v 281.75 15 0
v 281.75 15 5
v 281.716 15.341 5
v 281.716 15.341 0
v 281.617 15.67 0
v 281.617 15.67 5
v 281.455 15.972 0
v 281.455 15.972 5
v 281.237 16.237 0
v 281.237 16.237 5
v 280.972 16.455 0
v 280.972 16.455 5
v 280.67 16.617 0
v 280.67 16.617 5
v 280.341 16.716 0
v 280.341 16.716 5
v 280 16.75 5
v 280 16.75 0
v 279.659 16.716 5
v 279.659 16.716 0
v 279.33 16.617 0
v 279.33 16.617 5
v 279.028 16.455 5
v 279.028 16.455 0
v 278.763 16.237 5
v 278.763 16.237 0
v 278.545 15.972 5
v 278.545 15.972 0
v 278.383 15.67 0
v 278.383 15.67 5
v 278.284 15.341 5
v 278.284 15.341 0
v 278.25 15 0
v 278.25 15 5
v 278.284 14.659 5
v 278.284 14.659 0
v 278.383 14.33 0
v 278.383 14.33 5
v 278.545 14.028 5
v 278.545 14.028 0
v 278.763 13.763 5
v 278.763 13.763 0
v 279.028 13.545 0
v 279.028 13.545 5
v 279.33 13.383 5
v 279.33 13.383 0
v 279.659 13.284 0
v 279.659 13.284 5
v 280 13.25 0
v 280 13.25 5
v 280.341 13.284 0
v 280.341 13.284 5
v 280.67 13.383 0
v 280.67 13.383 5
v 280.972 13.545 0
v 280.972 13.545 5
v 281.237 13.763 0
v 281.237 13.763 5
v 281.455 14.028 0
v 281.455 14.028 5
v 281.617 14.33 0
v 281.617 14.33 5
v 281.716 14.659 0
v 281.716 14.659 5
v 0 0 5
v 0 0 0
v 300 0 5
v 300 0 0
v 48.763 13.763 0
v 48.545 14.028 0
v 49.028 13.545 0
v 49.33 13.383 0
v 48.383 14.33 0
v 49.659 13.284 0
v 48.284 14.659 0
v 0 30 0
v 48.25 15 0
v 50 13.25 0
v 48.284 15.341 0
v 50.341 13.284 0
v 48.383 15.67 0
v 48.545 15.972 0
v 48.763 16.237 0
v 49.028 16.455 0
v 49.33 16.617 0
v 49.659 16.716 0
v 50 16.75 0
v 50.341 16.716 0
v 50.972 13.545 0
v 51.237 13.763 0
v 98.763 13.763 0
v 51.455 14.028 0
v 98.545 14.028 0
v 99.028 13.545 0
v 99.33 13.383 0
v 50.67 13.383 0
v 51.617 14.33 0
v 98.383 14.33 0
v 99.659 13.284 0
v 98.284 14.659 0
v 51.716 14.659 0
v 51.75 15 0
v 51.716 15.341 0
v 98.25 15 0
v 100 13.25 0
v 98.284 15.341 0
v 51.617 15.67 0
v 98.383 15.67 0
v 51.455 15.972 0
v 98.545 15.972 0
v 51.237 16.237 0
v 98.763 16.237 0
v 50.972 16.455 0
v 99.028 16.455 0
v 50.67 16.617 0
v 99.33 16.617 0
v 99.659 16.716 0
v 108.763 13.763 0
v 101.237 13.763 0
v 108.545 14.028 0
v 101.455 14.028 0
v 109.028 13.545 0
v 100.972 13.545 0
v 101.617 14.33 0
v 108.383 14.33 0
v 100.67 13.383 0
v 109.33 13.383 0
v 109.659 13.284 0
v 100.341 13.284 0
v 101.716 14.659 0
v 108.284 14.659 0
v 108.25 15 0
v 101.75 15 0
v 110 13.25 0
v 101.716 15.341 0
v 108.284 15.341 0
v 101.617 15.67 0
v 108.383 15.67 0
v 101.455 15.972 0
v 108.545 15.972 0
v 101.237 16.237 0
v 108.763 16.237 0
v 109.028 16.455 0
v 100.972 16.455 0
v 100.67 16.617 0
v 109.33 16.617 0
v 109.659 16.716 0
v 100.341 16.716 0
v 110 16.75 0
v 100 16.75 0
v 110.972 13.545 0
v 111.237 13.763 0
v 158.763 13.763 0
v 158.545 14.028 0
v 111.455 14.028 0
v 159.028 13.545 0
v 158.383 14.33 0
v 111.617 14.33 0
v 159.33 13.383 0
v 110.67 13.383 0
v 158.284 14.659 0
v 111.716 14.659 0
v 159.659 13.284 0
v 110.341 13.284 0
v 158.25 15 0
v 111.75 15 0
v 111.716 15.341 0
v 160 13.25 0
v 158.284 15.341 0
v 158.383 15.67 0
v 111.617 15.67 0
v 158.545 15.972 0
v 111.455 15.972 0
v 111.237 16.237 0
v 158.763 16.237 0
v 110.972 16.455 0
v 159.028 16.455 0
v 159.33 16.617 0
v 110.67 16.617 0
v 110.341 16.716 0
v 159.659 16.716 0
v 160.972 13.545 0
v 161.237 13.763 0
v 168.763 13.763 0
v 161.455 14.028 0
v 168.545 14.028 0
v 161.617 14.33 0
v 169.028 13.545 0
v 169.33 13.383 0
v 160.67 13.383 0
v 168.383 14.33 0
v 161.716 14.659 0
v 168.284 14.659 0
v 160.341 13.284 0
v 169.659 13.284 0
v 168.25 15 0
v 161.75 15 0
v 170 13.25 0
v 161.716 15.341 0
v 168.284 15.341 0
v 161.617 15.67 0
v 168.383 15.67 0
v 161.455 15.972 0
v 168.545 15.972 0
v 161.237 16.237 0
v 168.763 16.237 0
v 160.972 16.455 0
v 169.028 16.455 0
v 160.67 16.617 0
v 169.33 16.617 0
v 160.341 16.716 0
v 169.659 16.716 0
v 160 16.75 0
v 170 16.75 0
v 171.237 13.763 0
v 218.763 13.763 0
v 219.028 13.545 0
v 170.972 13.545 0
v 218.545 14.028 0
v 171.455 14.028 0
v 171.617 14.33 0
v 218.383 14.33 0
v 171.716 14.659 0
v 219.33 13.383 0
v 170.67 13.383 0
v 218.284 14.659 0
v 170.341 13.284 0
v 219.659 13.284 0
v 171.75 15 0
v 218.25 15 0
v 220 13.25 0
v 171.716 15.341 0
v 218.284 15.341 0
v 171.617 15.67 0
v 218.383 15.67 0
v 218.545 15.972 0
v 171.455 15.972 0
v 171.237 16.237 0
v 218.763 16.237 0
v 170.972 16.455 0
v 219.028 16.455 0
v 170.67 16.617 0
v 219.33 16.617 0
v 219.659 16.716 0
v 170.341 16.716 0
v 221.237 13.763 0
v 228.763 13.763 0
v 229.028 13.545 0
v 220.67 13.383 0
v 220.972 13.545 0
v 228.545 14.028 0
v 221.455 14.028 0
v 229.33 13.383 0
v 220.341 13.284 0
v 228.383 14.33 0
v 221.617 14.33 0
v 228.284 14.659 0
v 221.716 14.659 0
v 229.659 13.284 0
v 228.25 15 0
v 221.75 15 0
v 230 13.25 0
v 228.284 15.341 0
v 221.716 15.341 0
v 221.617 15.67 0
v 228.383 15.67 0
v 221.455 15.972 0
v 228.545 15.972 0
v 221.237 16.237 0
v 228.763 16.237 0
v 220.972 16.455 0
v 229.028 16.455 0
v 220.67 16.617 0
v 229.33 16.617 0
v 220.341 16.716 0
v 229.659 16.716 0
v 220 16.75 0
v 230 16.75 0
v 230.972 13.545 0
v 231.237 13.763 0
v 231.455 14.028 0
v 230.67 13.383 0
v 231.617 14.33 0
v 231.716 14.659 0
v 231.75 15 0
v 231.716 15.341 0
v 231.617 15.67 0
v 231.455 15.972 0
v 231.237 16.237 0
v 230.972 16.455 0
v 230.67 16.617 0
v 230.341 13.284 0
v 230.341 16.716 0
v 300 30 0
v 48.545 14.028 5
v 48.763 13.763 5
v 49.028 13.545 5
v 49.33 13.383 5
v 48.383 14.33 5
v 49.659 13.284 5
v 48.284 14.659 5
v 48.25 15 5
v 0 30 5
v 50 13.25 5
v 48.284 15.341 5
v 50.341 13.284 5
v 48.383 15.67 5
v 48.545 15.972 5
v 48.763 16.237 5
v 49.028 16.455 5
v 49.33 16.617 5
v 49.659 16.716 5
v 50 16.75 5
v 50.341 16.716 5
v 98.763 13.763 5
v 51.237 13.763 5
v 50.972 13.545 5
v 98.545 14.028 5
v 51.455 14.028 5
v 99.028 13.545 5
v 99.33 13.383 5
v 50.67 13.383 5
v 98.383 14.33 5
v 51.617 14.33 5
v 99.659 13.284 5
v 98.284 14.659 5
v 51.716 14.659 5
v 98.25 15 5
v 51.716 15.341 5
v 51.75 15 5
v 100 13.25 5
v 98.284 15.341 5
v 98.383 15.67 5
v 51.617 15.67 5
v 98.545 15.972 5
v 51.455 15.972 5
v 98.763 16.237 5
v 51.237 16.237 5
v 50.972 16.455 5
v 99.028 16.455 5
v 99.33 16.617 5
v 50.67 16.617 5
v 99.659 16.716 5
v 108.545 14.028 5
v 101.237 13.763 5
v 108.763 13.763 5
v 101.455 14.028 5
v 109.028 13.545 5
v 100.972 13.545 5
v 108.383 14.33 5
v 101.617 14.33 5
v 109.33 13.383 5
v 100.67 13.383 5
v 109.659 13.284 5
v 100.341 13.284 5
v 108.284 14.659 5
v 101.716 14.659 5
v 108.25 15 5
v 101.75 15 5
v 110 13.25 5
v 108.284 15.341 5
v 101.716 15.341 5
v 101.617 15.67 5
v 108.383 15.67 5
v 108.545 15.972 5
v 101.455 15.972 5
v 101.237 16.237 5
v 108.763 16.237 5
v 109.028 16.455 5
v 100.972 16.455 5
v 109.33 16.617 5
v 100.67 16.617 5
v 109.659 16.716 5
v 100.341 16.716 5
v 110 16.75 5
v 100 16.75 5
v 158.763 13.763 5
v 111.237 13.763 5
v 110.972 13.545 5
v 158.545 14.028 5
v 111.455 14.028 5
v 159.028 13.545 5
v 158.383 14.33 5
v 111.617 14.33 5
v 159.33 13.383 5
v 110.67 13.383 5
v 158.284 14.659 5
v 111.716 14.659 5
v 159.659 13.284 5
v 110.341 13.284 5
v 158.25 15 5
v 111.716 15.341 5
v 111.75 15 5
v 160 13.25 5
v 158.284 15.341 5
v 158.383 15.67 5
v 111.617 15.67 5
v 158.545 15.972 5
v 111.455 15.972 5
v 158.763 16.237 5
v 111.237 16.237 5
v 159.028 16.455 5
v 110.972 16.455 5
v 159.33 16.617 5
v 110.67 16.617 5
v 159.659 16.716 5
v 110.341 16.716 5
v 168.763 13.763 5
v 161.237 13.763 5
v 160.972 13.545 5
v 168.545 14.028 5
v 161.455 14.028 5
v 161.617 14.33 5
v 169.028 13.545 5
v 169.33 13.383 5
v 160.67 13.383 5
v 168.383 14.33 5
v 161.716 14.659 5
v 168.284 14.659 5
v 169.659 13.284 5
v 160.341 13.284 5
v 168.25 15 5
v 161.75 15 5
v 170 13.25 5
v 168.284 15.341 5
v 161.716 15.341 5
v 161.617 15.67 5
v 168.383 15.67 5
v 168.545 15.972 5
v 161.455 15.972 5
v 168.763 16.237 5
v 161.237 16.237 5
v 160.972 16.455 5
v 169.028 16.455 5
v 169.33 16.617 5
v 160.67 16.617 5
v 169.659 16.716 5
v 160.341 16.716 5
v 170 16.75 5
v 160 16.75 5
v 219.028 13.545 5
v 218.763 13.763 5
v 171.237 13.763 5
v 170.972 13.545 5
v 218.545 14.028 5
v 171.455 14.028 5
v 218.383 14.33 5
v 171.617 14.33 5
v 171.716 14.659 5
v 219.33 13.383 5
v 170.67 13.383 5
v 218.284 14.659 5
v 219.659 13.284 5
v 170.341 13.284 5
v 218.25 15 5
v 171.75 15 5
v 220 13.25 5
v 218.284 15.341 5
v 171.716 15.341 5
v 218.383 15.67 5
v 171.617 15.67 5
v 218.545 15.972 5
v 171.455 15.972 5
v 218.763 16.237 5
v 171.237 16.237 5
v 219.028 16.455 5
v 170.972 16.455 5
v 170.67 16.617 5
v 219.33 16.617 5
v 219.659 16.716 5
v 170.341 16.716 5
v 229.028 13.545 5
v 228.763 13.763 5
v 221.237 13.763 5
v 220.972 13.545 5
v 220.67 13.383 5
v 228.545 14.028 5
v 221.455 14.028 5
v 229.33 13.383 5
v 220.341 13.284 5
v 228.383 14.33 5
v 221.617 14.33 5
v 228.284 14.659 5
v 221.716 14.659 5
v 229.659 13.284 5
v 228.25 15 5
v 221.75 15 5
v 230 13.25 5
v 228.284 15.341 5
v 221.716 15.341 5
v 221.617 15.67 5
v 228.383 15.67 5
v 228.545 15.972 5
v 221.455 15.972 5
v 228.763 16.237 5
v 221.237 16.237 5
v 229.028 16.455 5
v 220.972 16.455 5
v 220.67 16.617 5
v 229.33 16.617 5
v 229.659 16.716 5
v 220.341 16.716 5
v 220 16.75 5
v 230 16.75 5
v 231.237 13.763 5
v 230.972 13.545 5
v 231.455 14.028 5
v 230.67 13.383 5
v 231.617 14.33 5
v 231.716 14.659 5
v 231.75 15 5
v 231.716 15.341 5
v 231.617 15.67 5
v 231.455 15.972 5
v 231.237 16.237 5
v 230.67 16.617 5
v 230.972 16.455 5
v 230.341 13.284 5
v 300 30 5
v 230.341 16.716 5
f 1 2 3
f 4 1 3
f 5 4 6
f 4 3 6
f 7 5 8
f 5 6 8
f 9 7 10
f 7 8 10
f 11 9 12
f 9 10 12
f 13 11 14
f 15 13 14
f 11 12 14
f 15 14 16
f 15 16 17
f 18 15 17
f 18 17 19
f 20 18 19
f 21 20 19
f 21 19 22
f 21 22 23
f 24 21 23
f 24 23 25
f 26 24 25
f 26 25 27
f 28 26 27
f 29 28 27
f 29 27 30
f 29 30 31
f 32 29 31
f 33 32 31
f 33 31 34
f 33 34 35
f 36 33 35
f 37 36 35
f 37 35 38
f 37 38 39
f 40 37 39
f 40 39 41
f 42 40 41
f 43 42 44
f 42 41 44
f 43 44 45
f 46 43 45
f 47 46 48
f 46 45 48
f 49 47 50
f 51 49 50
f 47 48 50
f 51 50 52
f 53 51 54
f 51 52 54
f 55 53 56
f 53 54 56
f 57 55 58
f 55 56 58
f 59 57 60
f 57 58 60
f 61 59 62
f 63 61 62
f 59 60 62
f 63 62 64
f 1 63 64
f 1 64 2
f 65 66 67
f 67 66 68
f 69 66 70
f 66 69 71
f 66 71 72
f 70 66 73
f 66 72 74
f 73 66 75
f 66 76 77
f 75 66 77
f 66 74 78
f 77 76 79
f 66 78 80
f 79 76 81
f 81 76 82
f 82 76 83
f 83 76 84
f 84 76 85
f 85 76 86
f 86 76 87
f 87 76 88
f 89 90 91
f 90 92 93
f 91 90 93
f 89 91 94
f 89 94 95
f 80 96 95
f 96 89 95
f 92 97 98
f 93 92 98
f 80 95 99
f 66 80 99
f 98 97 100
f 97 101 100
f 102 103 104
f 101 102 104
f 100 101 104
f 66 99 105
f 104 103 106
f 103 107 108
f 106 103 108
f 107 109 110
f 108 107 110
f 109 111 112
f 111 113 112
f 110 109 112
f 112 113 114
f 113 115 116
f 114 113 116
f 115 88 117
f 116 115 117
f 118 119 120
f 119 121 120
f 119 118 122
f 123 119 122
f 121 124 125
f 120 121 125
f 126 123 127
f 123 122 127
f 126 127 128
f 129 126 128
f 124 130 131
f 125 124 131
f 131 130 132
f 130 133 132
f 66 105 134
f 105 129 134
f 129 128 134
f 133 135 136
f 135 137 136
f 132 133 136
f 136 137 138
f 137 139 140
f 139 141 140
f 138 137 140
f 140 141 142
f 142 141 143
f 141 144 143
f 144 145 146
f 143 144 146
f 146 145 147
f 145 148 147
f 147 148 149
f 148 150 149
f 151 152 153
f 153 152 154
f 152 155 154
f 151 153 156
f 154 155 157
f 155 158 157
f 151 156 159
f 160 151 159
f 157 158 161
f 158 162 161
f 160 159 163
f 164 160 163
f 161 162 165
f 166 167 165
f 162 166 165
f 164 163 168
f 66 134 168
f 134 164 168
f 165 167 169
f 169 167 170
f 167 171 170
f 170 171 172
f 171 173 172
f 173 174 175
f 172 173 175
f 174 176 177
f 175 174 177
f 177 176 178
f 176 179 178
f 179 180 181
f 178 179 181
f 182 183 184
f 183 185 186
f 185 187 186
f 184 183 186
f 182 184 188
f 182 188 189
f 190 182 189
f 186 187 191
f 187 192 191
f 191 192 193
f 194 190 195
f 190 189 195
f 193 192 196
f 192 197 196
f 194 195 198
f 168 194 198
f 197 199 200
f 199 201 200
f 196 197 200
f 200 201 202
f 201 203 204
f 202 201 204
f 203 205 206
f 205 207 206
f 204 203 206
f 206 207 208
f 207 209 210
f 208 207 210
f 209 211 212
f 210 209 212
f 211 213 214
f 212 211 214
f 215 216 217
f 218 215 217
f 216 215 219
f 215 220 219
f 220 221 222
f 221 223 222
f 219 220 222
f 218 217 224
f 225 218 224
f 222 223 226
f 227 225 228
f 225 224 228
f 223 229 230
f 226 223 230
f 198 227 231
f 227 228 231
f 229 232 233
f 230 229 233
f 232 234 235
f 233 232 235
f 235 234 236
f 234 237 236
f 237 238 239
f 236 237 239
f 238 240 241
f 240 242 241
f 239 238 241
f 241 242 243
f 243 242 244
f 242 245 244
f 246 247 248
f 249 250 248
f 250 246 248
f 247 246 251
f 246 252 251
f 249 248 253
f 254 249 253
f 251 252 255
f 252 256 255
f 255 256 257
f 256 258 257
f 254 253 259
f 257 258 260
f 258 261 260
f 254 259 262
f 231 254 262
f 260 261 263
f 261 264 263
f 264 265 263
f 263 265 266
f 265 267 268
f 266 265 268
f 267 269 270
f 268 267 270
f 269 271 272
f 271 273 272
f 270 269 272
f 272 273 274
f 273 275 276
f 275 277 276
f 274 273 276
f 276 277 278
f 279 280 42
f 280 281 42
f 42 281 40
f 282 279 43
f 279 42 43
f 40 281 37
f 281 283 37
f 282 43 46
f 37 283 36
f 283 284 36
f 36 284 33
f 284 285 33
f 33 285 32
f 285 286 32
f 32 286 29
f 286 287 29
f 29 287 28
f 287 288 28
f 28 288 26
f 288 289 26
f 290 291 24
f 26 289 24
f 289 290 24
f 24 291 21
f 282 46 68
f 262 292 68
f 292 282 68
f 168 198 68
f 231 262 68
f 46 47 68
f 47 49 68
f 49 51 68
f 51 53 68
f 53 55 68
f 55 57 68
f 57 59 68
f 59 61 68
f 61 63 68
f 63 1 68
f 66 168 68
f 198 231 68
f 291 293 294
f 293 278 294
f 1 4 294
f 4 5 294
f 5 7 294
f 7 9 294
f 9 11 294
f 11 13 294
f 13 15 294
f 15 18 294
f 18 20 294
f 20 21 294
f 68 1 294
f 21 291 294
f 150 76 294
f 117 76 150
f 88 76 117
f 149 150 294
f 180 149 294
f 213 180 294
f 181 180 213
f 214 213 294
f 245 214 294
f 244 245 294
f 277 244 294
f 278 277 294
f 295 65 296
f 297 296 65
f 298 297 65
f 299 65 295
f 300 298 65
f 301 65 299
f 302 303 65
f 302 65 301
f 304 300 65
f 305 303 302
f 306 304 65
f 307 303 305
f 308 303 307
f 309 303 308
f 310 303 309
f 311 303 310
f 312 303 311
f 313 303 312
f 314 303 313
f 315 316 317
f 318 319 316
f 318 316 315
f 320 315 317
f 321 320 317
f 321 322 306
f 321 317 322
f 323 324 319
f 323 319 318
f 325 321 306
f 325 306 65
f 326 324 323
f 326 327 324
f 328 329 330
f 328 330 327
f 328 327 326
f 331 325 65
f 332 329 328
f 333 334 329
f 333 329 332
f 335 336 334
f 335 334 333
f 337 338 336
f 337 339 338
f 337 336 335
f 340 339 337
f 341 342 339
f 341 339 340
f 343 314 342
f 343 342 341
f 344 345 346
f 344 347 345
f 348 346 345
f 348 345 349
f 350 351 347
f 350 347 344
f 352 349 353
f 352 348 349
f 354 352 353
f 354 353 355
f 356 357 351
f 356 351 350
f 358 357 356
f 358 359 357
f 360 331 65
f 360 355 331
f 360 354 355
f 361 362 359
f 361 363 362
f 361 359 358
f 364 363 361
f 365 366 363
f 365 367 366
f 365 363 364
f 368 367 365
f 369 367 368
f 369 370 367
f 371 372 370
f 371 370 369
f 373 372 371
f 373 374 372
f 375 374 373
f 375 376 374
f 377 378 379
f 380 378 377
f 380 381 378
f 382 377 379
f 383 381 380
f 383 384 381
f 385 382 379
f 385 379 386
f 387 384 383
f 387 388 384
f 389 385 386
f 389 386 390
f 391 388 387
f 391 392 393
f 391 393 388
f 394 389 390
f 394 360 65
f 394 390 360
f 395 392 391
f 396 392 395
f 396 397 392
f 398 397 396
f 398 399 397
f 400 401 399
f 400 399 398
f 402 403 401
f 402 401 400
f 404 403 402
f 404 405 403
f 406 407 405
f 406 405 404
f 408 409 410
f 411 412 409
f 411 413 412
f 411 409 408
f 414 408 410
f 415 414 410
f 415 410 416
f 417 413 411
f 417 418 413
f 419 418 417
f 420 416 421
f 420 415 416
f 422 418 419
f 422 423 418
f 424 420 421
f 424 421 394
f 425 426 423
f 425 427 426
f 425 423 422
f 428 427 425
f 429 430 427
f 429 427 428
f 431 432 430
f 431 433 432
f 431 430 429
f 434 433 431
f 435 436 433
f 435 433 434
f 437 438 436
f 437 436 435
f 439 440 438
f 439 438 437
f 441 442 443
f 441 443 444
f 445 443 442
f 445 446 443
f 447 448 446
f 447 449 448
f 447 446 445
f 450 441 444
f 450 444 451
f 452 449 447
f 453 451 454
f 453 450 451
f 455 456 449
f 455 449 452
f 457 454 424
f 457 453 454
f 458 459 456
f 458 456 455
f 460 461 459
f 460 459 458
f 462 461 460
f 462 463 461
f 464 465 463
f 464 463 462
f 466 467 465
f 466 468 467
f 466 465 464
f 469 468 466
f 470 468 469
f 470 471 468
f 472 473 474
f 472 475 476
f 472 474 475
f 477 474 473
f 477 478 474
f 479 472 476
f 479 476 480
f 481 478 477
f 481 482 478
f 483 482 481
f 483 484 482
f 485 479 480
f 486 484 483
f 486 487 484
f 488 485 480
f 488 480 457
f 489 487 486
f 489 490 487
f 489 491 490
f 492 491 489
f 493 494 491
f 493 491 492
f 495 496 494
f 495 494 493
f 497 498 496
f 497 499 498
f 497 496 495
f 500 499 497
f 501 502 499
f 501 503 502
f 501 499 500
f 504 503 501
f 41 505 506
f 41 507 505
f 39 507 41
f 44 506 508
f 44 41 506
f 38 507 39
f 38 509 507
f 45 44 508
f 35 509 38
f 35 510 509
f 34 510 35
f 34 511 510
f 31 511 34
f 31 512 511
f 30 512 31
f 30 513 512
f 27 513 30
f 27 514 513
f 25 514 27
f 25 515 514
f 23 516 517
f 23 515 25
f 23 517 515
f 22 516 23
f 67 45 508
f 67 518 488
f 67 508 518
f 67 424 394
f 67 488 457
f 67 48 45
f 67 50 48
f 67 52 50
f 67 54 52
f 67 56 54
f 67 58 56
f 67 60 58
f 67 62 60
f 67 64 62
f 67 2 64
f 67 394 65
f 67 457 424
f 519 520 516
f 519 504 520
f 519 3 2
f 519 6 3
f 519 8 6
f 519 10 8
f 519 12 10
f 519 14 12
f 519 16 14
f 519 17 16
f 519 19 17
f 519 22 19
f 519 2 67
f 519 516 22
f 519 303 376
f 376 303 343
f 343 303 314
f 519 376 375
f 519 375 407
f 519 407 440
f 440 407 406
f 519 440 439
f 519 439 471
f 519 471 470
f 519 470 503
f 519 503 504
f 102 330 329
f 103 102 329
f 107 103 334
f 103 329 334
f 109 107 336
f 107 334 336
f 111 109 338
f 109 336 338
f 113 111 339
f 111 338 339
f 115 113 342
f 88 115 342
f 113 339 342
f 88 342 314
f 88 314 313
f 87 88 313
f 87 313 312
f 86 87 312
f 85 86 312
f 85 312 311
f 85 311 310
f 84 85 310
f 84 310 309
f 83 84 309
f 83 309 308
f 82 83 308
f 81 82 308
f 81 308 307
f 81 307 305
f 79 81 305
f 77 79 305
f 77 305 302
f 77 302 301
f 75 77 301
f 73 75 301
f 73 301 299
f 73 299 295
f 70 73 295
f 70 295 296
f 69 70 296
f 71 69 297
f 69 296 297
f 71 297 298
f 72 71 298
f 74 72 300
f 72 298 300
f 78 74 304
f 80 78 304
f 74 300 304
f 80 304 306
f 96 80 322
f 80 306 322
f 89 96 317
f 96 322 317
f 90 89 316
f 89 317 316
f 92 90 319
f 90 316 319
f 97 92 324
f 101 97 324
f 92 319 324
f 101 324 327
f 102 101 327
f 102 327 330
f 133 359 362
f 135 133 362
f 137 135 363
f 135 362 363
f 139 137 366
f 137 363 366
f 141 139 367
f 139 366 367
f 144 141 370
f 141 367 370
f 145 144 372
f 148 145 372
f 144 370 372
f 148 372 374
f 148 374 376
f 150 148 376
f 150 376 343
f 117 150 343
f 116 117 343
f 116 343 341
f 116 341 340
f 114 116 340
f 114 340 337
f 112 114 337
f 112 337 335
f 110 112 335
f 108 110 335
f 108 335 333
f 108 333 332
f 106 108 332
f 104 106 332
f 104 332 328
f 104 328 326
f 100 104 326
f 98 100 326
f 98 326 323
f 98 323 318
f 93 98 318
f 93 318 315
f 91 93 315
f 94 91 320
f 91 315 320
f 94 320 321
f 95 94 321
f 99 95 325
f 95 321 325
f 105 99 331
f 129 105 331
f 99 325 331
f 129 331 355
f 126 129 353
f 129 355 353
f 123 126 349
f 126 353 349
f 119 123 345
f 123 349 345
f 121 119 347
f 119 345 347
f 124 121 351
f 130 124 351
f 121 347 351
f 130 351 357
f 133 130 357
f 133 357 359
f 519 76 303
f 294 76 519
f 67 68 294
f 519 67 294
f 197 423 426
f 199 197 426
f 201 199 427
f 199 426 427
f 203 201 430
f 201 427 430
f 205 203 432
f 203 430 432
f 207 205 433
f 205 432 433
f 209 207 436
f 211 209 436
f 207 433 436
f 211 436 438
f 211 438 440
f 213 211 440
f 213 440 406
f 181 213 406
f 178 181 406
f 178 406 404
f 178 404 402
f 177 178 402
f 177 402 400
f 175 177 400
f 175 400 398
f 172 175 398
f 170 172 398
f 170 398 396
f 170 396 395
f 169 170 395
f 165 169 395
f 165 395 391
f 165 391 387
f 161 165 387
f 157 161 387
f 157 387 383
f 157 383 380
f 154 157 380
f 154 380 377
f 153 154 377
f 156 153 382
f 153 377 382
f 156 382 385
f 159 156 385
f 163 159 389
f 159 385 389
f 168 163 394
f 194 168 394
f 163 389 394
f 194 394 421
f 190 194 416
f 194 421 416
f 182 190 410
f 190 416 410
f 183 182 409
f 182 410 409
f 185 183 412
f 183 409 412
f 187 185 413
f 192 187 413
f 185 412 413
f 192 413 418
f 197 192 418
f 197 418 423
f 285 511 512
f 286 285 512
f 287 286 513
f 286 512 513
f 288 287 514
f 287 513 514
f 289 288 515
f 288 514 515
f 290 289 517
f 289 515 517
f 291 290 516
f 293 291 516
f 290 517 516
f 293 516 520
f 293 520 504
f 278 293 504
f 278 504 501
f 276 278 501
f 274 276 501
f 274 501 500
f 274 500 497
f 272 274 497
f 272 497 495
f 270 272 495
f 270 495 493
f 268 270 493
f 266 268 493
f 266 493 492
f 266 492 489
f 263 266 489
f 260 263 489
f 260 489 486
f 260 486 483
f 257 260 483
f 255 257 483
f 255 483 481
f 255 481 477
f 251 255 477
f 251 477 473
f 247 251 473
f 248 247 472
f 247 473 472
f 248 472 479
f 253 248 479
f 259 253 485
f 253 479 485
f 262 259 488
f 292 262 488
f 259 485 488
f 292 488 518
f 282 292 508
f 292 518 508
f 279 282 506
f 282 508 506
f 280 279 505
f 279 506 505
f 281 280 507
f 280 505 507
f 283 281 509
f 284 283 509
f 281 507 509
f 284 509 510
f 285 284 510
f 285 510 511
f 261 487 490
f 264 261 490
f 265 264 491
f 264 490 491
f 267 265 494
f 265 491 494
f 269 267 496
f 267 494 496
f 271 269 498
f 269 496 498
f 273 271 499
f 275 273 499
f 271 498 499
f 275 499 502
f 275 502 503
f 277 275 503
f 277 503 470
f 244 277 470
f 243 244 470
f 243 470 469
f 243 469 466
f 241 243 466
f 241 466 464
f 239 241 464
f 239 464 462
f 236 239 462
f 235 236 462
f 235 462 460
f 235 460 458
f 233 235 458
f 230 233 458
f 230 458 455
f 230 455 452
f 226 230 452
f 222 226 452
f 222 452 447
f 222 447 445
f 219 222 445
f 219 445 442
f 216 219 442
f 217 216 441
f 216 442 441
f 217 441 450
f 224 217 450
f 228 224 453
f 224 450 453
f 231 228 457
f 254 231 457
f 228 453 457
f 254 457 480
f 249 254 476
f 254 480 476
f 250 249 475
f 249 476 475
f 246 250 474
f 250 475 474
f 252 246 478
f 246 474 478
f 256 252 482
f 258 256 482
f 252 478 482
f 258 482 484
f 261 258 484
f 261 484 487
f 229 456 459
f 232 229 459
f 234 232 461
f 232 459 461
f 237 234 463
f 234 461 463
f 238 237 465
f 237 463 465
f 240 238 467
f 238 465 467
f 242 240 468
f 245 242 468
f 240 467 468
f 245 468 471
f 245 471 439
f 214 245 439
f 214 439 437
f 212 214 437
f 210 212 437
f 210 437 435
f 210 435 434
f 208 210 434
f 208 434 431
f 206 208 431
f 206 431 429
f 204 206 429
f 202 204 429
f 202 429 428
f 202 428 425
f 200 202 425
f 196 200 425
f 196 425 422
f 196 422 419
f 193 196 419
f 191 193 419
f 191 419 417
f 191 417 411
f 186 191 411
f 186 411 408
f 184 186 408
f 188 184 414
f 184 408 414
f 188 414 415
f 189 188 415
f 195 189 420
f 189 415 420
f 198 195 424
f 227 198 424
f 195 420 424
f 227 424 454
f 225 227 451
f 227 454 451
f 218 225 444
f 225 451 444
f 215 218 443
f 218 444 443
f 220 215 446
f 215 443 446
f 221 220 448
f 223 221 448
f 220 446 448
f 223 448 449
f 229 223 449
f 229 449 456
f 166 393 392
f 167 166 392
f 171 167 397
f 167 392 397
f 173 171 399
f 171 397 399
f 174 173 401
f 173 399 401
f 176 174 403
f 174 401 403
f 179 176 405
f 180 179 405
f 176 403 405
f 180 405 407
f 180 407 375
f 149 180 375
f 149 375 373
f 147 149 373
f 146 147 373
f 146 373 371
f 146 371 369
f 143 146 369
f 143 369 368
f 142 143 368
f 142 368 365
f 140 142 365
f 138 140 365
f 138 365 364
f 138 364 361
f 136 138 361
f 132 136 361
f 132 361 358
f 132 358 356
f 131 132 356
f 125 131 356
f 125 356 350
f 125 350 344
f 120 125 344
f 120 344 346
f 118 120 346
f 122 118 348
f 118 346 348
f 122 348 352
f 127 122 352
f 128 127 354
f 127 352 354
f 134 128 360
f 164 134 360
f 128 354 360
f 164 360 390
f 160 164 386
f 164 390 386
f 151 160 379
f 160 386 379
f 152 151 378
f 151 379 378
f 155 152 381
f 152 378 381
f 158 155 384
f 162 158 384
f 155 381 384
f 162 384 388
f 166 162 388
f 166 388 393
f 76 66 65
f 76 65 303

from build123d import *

# Parameters (mm, degrees)
SKETCH1_W           = 300
SKETCH1_H           = 30
BOSS_EXTRUDE1_DEPTH = 5
SKETCH2_R           = 1.75
CUT_EXTRUDE1_DEPTH  = 6


with BuildPart() as part:
    # Sketch1 → Boss-Extrude1 (new body)
    with BuildSketch(Plane.XY):
        with Locations((150, 15)):
            Rectangle(SKETCH1_W, SKETCH1_H)
    extrude(amount=BOSS_EXTRUDE1_DEPTH)

    # Sketch2 → Cut-Extrude1 (cut, through all)
    with BuildSketch(Plane.XY.offset(5)):
        with Locations((280, 15)):
            Circle(SKETCH2_R)
        with Locations((230, 15)):
            Circle(SKETCH2_R)
        with Locations((170, 15)):
            Circle(SKETCH2_R)
        with Locations((220, 15)):
            Circle(SKETCH2_R)
        with Locations((110, 15)):
            Circle(SKETCH2_R)
        with Locations((160, 15)):
            Circle(SKETCH2_R)
        with Locations((50, 15)):
            Circle(SKETCH2_R)
        with Locations((100, 15)):
            Circle(SKETCH2_R)
    extrude(amount=-CUT_EXTRUDE1_DEPTH, mode=Mode.SUBTRACT)


solid = part.part
